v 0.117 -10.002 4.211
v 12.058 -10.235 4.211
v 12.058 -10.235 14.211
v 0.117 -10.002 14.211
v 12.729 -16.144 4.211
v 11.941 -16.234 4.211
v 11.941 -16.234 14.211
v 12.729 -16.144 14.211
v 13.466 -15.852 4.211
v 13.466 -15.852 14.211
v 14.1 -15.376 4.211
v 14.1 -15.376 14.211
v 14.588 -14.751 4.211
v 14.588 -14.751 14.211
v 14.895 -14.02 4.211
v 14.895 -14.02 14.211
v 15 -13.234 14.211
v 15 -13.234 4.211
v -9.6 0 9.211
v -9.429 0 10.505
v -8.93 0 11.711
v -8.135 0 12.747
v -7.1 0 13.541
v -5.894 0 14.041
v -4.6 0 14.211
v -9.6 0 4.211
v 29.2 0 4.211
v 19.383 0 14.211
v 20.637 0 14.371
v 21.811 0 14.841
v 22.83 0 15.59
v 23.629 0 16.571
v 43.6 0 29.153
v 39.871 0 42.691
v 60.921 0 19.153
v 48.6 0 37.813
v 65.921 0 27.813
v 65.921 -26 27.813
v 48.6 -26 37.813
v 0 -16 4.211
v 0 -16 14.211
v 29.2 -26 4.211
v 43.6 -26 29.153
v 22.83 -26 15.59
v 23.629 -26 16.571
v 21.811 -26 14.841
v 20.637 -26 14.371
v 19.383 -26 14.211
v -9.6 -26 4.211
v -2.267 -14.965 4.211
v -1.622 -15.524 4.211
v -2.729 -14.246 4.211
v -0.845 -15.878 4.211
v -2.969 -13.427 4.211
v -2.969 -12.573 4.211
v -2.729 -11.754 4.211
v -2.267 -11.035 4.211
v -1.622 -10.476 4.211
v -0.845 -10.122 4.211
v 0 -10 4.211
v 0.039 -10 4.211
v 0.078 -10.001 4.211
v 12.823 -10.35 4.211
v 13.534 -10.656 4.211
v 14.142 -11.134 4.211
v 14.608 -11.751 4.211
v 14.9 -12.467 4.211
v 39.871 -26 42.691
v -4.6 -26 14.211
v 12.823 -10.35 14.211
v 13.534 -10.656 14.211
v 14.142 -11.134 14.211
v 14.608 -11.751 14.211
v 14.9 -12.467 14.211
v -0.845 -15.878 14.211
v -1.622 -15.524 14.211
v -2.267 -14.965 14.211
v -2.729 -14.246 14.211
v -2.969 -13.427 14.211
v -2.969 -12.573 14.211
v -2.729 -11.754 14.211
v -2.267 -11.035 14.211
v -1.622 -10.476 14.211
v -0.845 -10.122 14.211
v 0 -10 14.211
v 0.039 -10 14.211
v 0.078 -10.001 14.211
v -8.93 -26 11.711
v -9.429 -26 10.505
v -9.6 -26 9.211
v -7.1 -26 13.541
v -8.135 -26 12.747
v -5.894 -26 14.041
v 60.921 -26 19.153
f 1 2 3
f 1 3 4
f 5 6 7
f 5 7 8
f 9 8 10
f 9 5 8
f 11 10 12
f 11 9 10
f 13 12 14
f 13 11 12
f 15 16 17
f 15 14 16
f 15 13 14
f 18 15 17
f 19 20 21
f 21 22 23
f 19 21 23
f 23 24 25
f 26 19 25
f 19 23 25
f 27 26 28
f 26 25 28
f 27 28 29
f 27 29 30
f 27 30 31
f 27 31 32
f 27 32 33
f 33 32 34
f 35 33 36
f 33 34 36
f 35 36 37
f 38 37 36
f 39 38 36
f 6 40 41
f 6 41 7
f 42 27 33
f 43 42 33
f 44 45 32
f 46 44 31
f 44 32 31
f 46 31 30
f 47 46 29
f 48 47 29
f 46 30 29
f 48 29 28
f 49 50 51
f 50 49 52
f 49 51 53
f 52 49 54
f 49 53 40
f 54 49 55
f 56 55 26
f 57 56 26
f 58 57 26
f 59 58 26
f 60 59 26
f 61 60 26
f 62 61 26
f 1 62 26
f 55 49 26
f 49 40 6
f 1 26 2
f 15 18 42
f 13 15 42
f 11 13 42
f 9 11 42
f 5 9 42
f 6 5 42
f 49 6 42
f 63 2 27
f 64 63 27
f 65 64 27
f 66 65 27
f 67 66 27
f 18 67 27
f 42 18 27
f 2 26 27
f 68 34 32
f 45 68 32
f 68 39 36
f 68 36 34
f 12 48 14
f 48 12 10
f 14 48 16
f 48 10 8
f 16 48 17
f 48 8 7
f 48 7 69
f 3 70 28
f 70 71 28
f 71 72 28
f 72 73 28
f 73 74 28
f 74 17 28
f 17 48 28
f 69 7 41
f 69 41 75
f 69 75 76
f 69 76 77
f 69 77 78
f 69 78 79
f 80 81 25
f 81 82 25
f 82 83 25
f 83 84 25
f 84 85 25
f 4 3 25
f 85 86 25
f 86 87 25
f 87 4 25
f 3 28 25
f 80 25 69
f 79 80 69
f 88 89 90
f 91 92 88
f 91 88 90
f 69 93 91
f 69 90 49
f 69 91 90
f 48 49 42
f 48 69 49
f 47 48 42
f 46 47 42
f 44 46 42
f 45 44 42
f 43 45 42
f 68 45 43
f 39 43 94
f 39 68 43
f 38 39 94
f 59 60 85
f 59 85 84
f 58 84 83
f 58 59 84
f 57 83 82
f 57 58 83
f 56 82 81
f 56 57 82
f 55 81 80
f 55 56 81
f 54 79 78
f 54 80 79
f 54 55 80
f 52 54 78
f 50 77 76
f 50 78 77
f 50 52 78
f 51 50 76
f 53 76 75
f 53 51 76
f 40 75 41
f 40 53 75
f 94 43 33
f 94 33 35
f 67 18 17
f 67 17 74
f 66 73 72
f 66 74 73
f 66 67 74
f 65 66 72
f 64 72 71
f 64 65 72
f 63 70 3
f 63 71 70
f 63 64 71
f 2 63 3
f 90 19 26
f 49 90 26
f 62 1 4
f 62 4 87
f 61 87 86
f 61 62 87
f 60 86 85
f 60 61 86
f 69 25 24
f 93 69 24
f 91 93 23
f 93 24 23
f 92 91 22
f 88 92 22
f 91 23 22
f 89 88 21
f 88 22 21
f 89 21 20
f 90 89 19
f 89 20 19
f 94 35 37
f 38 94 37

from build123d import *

# Parameters (mm, degrees)
F1_DEPTH = 26
F3_DEPTH = 42.692334


with BuildPart() as f1:
    # F0 (on Front) → F1 (new body)
    with BuildSketch(Plane.XZ):
        with BuildLine():
            Line((-9.599707, 9.211308), (-9.599707, 4.211308))
            Line((-9.599707, 4.211308), (29.200293, 4.211308))
            Line((29.200293, 4.211308), (43.600293, 29.152839))
            Line((43.600293, 29.152839), (48.600293, 37.813093))
            Line((48.600293, 37.813093), (39.870873, 42.691334))
            Line((39.870873, 42.691334), (23.628611, 16.571015))
            ThreePointArc((23.628611, 16.571015), (21.811412, 14.840869), (19.382571, 14.211308))
            Line((19.382571, 14.211308), (-4.599707, 14.211308))
            ThreePointArc((-4.599707, 14.211308), (-8.135241, 12.746842), (-9.599707, 9.211308))
        make_face()
        Polygon((48.600293, 37.813093), (43.600293, 29.152839), (60.920801, 19.152839), (65.920801, 27.813093), align=None)
    extrude(amount=F1_DEPTH)

    # F2 (on Top) → F3 (cut, through all)
    with BuildSketch(Plane.XY):
        with BuildLine():
            Line((0.116861, -10.002277), (0, -10))
            ThreePointArc((0, -10), (-3, -13), (0, -16))
            ThreePointArc((0, -16), (2.12132, -15.12132), (3, -13))
            ThreePointArc((3, -13), (2.162242, -10.920407), (0.116861, -10.002277))
        make_face()
        with BuildLine():
            ThreePointArc((0.116861, -10.002277), (0.058442, -10.000569), (0, -10))
            Line((0, -10), (0.116861, -10.002277))
        make_face()
        with BuildLine():
            ThreePointArc((3, -13), (2.12132, -15.12132), (0, -16))
            Line((0, -16), (11.941272, -16.233806))
            ThreePointArc((11.941272, -16.233806), (9.000572, -13.175796), (12.058442, -10.23495))
            Line((12.058442, -10.23495), (0.116861, -10.002277))
            ThreePointArc((0.116861, -10.002277), (2.162242, -10.920407), (3, -13))
        make_face()
        with BuildLine():
            ThreePointArc((12.058442, -10.23495), (9.000572, -13.175796), (11.941272, -16.233806))
            ThreePointArc((11.941272, -16.233806), (14.100454, -15.376364), (15, -13.234381))
            ThreePointArc((15, -13.234381), (14.141883, -11.133824), (12.058442, -10.23495))
        make_face()
    extrude(amount=F3_DEPTH, mode=Mode.SUBTRACT)


solid = f1.part
